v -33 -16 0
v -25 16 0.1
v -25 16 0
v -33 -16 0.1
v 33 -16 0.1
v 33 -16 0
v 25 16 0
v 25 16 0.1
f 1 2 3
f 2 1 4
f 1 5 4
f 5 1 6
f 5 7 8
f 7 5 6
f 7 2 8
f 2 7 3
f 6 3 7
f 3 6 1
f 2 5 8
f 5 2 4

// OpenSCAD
use <../lib.scad>
function ldraw_lib__6022692d() = [
// 0 Sticker Trapezoidal with Movie Screen
// 0 Name: 6022692d.dat
// 0 Author: Orion Pobursky [OrionP]
// 0 !LDRAW_ORG Part UPDATE 2023-03
// 0 !LICENSE Licensed under CC BY 4.0 : see CAreadme.txt
// 
// 0 BFC CERTIFY CCW
  [0,"BFC","CERTIFY"],
  [0,"BFC","CCW"],
// 
// 0 !KEYWORDS set 10232
// 
// 0 !HISTORY 2023-06-24 [OrionP] Official Update 2023-03
// 
// 
// 4 16 -62.5 0 40 -82.5 0 -40 -82.5 -0.25 -40 -62.5 -0.25 40
  [4,16,-62.5,0,40,-82.5,0,-40,-82.5,-0.25,-40,-62.5,-0.25,40],
// 4 16 -82.5 0 -40 82.5 0 -40 82.5 -0.25 -40 -82.5 -0.25 -40
  [4,16,-82.5,0,-40,82.5,0,-40,82.5,-0.25,-40,-82.5,-0.25,-40],
// 4 16 82.5 0 -40 62.5 0 40 62.5 -0.25 40 82.5 -0.25 -40
  [4,16,82.5,0,-40,62.5,0,40,62.5,-0.25,40,82.5,-0.25,-40],
// 4 16 62.5 0 40 -62.5 0 40 -62.5 -0.25 40 62.5 -0.25 40
  [4,16,62.5,0,40,-62.5,0,40,-62.5,-0.25,40,62.5,-0.25,40],
// 4 16 62.5 0 40 82.5 0 -40 -82.5 0 -40 -62.5 0 40
  [4,16,62.5,0,40,82.5,0,-40,-82.5,0,-40,-62.5,0,40],
// 
// 0 !TEXMAP START PLANAR -82.5 -0.25 40 82.5 -0.25 40 -82.5 -0.25 -40 6022692d.png
// 0 !: 4 15 -62.5 -0.25 40 -82.5 -0.25 -40 82.5 -0.25 -40 62.5 -0.25 40
// 0 !TEXMAP FALLBACK
// 4 15 -62.5 -0.25 40 -82.5 -0.25 -40 82.5 -0.25 -40 62.5 -0.25 40
  [4,15,-62.5,-0.25,40,-82.5,-0.25,-40,82.5,-0.25,-40,62.5,-0.25,40],
// 0 !TEXMAP END
// 
];
module ldraw_lib__6022692d(step=0, col=false, unit=2/5, alt=false, line=0.2, solid=!$preview)
    makepoly(ldraw_lib__6022692d(), step=step, col=col, unit=unit, alt=alt, line=line, solid=solid);
ldraw_lib__6022692d(line=0.2);
